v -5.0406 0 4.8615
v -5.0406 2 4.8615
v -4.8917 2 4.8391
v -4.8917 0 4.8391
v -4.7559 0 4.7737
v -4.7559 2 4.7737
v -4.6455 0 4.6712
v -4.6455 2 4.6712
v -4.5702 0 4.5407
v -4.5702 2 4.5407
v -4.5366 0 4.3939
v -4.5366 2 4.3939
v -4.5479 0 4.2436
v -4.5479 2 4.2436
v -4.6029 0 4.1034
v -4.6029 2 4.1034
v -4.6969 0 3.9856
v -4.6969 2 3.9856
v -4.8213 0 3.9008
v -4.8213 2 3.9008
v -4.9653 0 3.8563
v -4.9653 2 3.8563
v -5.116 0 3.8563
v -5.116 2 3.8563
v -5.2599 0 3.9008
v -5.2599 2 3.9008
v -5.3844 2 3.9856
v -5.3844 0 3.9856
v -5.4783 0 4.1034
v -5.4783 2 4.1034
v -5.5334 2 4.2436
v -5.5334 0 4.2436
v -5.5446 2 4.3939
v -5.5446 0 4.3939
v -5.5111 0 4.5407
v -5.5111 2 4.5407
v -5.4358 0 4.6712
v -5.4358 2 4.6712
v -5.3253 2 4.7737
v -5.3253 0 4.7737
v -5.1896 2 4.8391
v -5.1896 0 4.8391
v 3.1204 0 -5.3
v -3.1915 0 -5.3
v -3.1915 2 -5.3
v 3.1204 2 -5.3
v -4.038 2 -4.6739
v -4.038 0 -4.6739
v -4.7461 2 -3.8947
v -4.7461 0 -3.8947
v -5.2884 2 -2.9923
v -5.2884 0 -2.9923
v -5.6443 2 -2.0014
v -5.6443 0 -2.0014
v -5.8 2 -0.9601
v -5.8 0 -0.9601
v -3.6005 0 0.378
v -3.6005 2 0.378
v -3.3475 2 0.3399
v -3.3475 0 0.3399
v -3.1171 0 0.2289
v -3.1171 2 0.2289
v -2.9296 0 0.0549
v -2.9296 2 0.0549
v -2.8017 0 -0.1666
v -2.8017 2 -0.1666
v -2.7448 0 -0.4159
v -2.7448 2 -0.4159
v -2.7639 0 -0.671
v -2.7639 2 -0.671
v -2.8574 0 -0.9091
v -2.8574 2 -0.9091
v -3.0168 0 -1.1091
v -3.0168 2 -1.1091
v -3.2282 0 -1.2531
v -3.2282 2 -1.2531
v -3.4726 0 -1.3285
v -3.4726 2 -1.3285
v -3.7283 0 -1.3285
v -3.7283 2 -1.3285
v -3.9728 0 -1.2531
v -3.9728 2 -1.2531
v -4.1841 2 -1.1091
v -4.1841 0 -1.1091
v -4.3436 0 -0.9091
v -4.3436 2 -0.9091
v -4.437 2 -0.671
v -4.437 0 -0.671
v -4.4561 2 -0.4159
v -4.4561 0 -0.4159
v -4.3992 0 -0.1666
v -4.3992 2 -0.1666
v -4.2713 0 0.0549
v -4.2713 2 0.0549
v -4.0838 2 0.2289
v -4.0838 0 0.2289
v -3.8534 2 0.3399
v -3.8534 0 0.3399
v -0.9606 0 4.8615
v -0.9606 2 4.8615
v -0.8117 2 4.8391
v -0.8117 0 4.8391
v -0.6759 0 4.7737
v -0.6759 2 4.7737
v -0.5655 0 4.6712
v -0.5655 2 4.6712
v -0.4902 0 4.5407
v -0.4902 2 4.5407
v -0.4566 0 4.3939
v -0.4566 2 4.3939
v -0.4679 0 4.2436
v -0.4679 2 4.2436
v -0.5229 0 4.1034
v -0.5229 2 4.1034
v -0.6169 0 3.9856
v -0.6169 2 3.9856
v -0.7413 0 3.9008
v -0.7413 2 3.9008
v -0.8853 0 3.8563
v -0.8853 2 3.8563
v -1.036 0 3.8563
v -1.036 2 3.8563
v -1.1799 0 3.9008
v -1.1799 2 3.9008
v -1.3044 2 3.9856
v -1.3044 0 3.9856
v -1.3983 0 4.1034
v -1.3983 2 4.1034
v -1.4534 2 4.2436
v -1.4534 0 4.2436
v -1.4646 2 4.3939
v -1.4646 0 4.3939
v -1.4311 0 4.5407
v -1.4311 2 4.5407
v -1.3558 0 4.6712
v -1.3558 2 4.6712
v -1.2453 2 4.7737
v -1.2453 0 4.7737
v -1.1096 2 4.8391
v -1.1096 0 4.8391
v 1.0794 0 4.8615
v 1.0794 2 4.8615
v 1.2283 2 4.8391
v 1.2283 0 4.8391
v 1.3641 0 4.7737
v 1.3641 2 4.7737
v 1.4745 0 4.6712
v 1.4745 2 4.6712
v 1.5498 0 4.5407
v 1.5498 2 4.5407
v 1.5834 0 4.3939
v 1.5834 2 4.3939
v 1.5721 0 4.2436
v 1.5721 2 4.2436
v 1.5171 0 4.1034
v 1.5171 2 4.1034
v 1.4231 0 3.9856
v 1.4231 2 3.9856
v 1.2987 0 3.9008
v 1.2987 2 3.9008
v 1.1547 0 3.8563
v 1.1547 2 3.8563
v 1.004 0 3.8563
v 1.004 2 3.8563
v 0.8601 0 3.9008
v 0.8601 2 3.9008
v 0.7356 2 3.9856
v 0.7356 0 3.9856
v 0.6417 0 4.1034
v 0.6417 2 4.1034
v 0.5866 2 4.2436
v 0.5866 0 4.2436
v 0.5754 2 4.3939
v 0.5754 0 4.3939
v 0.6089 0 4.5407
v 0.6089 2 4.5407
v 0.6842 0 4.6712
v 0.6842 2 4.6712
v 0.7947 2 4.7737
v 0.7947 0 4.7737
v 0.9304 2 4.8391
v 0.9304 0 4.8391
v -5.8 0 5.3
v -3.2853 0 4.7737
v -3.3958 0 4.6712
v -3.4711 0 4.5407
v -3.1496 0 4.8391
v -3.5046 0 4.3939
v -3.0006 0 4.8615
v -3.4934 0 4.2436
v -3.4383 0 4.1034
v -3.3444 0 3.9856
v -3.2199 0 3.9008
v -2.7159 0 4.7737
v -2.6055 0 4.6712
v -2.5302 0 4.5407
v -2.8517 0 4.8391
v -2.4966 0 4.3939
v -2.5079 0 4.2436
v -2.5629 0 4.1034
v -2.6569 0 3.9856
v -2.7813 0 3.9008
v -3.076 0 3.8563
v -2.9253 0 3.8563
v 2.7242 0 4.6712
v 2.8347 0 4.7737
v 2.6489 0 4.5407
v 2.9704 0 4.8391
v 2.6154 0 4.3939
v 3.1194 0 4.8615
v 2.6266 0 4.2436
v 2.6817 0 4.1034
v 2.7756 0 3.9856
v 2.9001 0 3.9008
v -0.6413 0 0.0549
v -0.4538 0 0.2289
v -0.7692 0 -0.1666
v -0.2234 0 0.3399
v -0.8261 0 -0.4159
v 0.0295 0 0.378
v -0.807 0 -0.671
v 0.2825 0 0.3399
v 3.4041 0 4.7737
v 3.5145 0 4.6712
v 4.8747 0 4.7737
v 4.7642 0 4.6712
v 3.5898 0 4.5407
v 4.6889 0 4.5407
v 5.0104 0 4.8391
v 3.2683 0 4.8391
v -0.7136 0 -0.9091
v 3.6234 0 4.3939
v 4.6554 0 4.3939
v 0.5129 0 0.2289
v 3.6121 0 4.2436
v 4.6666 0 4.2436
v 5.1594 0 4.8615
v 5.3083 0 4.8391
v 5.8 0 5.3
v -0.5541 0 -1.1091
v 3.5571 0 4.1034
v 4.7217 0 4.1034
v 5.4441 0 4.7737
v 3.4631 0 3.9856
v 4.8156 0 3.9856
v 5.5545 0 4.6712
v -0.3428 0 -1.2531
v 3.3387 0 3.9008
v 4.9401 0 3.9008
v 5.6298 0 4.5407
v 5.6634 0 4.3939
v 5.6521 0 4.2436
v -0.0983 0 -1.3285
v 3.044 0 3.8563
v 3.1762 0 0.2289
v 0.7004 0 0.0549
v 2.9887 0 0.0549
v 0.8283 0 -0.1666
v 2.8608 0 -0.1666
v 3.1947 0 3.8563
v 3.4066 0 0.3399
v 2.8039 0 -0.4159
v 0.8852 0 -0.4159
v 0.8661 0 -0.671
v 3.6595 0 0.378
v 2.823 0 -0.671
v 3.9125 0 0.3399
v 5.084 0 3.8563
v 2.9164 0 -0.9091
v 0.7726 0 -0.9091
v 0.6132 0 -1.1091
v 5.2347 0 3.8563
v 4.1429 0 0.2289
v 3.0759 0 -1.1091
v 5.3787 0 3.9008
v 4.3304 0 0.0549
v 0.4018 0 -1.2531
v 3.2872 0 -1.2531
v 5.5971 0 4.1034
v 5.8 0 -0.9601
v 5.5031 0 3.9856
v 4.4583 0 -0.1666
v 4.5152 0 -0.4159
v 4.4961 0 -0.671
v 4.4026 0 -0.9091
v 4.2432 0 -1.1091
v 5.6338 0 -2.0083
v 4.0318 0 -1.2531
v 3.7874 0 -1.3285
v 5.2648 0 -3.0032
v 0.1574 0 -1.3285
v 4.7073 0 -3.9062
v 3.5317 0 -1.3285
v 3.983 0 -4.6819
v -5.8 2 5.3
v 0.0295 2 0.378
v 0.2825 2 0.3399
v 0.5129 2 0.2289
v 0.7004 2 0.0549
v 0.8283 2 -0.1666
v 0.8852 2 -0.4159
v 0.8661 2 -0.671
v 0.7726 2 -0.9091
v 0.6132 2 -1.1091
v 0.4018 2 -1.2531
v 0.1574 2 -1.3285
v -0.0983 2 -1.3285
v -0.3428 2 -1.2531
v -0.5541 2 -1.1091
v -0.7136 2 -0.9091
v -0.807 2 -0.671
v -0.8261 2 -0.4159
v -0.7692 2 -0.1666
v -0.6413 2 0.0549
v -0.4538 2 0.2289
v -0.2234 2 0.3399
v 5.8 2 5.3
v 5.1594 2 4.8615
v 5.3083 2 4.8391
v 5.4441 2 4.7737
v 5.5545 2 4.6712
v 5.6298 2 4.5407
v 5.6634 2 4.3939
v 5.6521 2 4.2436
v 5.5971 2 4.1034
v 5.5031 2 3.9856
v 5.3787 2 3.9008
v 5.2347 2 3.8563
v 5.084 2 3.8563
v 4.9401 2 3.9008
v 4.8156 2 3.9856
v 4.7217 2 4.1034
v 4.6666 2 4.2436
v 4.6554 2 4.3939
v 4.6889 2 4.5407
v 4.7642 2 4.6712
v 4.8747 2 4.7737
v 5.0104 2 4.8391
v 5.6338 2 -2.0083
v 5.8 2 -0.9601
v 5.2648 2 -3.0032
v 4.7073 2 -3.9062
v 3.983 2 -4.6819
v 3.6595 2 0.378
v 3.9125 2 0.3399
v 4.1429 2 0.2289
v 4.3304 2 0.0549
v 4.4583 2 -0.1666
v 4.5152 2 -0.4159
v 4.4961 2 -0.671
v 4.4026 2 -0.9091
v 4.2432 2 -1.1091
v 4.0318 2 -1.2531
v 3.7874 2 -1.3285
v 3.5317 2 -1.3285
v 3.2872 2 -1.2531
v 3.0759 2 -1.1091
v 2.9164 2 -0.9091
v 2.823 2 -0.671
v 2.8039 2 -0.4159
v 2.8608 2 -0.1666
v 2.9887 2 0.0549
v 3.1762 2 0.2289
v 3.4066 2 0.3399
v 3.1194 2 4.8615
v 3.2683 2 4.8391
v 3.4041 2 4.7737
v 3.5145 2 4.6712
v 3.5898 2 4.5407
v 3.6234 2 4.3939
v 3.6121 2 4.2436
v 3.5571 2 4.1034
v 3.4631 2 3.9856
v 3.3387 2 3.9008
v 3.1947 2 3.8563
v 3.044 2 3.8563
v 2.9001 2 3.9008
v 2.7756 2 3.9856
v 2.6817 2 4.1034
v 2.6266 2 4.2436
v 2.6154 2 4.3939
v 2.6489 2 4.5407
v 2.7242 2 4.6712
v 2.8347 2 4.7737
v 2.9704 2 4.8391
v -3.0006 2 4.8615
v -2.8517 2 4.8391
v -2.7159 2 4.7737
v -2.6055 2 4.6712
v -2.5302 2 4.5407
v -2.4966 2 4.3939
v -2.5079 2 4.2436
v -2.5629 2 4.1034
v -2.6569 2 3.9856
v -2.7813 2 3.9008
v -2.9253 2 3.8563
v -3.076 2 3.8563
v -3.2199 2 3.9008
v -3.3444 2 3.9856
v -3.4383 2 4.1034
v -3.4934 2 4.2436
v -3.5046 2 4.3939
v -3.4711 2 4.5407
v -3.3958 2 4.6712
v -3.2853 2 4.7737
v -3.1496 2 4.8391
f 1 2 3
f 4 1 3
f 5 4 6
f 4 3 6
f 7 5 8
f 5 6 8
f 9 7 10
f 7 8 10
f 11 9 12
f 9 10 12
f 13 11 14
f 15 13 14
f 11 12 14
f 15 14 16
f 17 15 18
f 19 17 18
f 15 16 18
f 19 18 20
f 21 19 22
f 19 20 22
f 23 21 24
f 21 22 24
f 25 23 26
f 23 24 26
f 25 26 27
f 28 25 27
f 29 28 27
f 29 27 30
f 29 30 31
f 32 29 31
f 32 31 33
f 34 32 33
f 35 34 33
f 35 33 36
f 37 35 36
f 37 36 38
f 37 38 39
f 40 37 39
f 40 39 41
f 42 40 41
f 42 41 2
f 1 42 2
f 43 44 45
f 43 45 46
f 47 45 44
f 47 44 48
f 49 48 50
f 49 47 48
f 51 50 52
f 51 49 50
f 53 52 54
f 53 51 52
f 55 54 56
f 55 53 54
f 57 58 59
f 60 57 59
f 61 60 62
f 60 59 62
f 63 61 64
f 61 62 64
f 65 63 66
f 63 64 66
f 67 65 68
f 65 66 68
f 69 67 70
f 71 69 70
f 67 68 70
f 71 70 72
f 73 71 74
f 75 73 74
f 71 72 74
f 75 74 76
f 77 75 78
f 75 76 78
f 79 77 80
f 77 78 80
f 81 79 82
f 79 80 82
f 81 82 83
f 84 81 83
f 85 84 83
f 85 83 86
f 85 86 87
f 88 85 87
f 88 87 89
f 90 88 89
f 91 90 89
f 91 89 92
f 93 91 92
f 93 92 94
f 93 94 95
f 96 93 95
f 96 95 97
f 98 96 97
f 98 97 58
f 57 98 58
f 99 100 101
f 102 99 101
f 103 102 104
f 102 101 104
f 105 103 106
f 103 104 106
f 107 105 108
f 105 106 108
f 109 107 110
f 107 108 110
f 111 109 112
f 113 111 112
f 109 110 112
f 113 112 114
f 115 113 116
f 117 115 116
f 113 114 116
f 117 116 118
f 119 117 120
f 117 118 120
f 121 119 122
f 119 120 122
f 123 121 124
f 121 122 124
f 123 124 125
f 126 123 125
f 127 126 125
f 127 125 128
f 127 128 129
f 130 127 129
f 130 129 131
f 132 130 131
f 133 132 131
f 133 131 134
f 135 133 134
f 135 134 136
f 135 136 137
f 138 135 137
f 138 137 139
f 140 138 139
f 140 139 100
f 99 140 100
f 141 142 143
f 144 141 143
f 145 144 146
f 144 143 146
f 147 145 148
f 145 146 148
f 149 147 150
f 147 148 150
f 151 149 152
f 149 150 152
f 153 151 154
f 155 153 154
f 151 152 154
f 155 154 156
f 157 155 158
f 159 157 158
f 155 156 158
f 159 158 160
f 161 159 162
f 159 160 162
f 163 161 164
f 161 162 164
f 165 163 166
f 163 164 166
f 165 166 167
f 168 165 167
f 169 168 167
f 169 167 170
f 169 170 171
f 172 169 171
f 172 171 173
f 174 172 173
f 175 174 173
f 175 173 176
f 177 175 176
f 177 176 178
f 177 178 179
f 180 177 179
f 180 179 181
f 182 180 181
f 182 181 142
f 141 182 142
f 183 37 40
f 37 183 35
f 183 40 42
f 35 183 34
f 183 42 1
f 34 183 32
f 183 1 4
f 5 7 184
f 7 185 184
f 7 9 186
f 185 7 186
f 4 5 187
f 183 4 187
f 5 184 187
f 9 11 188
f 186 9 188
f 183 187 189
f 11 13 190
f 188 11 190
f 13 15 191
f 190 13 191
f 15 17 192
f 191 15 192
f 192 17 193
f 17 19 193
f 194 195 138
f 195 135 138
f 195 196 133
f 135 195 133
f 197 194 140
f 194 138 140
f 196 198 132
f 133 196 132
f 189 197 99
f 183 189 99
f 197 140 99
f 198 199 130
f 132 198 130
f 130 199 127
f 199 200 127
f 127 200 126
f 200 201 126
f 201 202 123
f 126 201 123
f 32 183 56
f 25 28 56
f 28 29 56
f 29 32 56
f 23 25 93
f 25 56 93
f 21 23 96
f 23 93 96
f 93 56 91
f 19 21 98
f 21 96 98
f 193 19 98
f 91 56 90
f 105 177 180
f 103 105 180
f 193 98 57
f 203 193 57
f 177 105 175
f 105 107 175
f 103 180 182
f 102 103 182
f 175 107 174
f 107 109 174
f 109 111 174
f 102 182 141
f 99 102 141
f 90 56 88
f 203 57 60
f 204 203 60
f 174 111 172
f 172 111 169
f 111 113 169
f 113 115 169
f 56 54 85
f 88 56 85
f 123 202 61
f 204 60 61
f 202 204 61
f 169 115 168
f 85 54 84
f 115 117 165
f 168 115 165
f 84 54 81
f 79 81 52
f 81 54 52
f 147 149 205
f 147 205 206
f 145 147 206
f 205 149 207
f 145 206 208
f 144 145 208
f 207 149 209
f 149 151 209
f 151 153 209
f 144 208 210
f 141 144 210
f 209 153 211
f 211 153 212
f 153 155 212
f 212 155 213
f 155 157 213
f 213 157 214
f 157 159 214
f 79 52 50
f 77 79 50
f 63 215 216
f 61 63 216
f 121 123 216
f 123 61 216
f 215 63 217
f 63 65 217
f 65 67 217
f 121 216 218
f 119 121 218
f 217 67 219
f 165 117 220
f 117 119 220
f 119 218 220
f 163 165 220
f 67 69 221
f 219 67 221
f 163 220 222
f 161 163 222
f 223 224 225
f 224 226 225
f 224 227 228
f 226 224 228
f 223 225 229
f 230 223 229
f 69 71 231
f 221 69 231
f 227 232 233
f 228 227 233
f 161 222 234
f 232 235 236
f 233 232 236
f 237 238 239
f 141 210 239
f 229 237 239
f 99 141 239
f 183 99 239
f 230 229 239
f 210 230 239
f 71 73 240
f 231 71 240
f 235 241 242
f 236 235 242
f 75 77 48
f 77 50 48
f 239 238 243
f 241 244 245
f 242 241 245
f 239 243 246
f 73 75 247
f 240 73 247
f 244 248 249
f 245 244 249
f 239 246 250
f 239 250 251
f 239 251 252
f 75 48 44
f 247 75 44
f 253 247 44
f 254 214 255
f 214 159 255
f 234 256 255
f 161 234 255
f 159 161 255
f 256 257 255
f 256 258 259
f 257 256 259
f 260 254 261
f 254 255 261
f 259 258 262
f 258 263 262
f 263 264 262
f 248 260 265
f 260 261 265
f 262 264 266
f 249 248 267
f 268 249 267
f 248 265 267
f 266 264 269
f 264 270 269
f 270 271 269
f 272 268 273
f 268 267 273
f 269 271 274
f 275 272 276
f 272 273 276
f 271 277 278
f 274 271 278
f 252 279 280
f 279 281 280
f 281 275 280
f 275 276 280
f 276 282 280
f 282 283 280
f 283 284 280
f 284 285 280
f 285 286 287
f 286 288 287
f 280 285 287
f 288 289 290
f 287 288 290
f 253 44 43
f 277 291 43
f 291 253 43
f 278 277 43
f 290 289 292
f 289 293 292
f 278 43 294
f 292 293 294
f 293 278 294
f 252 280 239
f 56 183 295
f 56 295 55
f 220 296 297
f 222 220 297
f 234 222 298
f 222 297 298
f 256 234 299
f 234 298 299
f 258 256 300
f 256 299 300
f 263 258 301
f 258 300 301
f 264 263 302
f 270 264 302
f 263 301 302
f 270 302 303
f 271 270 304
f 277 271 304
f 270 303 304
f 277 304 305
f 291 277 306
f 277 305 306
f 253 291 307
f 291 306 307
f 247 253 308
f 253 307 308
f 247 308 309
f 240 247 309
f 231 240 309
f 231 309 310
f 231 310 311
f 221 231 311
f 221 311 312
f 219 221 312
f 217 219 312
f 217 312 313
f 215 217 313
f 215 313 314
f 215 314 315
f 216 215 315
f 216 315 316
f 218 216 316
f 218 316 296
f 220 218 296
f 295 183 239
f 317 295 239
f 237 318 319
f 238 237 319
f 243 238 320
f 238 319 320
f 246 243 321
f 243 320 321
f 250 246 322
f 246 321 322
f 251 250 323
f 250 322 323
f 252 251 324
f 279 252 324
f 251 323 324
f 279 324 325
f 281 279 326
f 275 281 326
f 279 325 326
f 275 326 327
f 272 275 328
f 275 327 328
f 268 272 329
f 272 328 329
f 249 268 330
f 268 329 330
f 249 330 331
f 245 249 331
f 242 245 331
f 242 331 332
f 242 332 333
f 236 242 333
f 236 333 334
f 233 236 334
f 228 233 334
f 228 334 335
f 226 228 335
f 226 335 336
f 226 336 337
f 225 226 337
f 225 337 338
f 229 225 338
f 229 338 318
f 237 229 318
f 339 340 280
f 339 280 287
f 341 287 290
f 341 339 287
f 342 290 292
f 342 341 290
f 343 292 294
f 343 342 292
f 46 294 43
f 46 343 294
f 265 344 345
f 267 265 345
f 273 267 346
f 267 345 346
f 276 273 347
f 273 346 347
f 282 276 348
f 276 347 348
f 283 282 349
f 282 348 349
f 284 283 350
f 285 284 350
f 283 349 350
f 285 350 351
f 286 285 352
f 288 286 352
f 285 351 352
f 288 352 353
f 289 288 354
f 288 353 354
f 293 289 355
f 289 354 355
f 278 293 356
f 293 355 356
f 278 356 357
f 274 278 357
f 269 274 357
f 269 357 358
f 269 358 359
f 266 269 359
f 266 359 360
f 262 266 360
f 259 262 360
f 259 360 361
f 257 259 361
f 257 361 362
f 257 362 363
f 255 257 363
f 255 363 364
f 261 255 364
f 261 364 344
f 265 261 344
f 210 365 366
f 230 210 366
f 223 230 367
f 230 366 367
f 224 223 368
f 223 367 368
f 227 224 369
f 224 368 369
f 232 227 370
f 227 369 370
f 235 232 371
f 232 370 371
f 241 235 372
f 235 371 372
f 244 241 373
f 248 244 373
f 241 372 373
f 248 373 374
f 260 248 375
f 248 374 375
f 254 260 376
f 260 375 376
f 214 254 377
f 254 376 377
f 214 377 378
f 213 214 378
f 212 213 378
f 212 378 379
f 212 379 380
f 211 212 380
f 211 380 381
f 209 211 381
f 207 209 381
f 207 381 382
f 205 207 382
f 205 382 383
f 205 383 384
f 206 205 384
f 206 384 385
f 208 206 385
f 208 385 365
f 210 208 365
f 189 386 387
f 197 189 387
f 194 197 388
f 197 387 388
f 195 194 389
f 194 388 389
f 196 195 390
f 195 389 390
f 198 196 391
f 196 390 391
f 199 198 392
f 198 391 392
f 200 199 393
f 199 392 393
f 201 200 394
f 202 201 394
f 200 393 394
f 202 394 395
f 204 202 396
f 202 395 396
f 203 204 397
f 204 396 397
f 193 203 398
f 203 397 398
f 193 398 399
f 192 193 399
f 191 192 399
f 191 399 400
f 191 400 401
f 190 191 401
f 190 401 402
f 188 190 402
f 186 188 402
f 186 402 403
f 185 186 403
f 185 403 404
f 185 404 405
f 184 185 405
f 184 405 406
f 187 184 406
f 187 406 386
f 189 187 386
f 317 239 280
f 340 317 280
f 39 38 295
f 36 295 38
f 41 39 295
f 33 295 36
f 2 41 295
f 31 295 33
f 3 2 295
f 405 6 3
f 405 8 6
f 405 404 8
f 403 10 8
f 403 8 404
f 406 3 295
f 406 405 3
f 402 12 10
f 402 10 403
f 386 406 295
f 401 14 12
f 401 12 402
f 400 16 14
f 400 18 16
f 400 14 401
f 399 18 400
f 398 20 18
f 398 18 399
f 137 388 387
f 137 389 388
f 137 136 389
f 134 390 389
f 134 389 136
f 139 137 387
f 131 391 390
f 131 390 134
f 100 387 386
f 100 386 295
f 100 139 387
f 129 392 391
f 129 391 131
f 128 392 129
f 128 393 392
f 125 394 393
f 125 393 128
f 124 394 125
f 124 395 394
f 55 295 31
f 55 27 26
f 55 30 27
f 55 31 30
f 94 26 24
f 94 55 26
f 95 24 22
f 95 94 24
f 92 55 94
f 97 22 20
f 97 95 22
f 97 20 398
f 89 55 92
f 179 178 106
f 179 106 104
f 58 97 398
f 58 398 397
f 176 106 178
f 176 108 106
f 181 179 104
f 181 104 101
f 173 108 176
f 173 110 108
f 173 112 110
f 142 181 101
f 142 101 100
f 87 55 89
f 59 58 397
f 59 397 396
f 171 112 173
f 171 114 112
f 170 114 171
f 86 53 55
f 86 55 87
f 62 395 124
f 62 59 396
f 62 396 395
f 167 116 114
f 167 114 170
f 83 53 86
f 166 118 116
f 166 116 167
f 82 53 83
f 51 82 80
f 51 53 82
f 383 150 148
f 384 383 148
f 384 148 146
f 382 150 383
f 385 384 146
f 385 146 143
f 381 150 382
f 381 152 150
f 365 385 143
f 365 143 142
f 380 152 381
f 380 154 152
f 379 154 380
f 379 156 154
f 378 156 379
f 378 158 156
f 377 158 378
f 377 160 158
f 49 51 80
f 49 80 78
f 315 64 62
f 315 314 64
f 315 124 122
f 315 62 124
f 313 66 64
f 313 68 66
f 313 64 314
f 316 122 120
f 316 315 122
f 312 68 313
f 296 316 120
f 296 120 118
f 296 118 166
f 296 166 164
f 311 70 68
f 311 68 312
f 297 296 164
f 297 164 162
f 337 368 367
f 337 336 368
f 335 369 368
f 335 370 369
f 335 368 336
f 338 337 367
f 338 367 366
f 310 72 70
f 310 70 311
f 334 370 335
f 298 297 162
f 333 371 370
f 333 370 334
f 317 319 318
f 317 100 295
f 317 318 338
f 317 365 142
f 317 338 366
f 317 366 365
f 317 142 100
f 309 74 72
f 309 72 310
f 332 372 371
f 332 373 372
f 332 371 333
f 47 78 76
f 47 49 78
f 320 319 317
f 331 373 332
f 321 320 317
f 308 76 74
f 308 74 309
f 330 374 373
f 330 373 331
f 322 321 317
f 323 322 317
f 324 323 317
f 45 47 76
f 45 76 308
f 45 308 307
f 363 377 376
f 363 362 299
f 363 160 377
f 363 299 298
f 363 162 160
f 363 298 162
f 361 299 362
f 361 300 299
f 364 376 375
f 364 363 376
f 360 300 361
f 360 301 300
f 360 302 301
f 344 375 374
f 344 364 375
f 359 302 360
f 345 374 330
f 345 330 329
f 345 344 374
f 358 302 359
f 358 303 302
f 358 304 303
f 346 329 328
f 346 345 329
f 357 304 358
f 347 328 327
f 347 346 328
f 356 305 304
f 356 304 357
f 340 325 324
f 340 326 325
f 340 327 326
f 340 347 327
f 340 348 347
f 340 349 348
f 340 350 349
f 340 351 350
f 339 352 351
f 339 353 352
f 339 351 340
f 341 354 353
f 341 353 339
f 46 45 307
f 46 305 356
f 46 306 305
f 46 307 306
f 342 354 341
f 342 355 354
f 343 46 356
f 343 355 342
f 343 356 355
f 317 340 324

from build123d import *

# Parameters (mm, degrees)
SKETCH1_W           = 11.6
SKETCH1_H           = 10.6
BOSS_EXTRUDE1_DEPTH = 2
SKETCH2_R           = 0.85805849
SKETCH2_R_2         = 0.505403016
CUT_EXTRUDE1_DEPTH  = 9.107404023


with BuildPart() as part:
    # Sketch1 → Boss-Extrude1 (new body)
    with BuildSketch(Plane(origin=(0, 0, 0), x_dir=(1, 0, 0), z_dir=(0, 1, 0))):
        Rectangle(SKETCH1_W, SKETCH1_H)
    extrude(amount=BOSS_EXTRUDE1_DEPTH)

    # Sketch2 → Cut-Extrude1 (cut, through all)
    with BuildSketch(Plane(origin=(0, 2, 0), x_dir=(1, 0, 0), z_dir=(0, 1, 0))):
        with Locations(Location((-3.600453249, 0.480060433, 0), (0, 0, 270))):
            Circle(SKETCH2_R)
        with Locations(Location((0.029546751, 0.480060433, 0), (0, 0, 270))):
            Circle(SKETCH2_R)
        with Locations(Location((3.659546751, 0.480060433, 0), (0, 0, 270))):
            Circle(SKETCH2_R)
        with Locations(Location((-5.040634548, -4.35610393, 0), (0, 0, 270))):
            Circle(SKETCH2_R_2)
        with Locations(Location((-3.000634548, -4.35610393, 0), (0, 0, 270))):
            Circle(SKETCH2_R_2)
        with Locations(Location((-0.960634548, -4.35610393, 0), (0, 0, 270))):
            Circle(SKETCH2_R_2)
        with Locations(Location((1.079365452, -4.35610393, 0), (0, 0, 270))):
            Circle(SKETCH2_R_2)
        with Locations(Location((3.119365452, -4.35610393, 0), (0, 0, 270))):
            Circle(SKETCH2_R_2)
        with Locations(Location((5.159365452, -4.35610393, 0), (0, 0, 270))):
            Circle(SKETCH2_R_2)
        with BuildLine():
            Line((-5.8, 0.960120866), (-5.8, 5.3))
            Line((-5.8, 5.3), (-3.19151288, 5.3))
            ThreePointArc((-3.19151288, 5.3), (-5.039424989, 3.456832761), (-5.8, 0.960120866))
        make_face()
        with BuildLine():
            Line((3.120392815, 5.3), (5.8, 5.3))
            Line((5.8, 5.3), (5.8, 0.960120866))
            ThreePointArc((5.8, 0.960120866), (5.008377062, 3.468528113), (3.120392815, 5.3))
        make_face()
    extrude(amount=-CUT_EXTRUDE1_DEPTH, mode=Mode.SUBTRACT)


solid = part.part
